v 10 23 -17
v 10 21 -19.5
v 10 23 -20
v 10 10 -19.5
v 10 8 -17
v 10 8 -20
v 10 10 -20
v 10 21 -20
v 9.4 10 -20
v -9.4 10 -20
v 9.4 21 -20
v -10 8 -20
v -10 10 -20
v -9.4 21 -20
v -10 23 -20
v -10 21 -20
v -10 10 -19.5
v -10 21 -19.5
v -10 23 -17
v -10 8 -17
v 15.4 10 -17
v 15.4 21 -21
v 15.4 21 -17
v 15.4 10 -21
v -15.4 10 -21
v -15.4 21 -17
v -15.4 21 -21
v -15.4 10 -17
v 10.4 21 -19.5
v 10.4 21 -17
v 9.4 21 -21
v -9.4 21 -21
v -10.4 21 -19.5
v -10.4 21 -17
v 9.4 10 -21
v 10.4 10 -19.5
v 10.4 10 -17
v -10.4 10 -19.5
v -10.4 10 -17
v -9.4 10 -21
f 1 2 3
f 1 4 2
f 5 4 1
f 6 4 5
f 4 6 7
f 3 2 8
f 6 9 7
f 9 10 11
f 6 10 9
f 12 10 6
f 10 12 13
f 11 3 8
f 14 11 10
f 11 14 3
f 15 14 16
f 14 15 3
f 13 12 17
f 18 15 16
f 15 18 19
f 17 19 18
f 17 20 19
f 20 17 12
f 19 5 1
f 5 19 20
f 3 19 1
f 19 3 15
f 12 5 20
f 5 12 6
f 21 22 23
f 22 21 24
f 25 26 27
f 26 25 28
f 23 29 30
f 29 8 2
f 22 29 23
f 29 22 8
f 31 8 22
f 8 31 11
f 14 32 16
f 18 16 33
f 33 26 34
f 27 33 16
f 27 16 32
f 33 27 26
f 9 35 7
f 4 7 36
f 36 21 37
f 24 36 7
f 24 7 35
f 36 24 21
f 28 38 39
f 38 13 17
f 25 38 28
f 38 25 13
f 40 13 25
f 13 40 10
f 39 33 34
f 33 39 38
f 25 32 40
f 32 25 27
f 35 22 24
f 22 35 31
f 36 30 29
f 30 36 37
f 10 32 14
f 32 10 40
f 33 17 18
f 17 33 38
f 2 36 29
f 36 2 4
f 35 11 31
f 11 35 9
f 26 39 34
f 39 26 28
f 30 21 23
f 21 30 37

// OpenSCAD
// v1.2 actual bottom-hook detail. The green geometry is the real 1.5 mm hook
// volume at z=-21..-19.5; upper walls and the centre bore are not shown here.
use <candidate_continuous_corner_walls.scad>;
$fn=48;
candidate_hook_check();
